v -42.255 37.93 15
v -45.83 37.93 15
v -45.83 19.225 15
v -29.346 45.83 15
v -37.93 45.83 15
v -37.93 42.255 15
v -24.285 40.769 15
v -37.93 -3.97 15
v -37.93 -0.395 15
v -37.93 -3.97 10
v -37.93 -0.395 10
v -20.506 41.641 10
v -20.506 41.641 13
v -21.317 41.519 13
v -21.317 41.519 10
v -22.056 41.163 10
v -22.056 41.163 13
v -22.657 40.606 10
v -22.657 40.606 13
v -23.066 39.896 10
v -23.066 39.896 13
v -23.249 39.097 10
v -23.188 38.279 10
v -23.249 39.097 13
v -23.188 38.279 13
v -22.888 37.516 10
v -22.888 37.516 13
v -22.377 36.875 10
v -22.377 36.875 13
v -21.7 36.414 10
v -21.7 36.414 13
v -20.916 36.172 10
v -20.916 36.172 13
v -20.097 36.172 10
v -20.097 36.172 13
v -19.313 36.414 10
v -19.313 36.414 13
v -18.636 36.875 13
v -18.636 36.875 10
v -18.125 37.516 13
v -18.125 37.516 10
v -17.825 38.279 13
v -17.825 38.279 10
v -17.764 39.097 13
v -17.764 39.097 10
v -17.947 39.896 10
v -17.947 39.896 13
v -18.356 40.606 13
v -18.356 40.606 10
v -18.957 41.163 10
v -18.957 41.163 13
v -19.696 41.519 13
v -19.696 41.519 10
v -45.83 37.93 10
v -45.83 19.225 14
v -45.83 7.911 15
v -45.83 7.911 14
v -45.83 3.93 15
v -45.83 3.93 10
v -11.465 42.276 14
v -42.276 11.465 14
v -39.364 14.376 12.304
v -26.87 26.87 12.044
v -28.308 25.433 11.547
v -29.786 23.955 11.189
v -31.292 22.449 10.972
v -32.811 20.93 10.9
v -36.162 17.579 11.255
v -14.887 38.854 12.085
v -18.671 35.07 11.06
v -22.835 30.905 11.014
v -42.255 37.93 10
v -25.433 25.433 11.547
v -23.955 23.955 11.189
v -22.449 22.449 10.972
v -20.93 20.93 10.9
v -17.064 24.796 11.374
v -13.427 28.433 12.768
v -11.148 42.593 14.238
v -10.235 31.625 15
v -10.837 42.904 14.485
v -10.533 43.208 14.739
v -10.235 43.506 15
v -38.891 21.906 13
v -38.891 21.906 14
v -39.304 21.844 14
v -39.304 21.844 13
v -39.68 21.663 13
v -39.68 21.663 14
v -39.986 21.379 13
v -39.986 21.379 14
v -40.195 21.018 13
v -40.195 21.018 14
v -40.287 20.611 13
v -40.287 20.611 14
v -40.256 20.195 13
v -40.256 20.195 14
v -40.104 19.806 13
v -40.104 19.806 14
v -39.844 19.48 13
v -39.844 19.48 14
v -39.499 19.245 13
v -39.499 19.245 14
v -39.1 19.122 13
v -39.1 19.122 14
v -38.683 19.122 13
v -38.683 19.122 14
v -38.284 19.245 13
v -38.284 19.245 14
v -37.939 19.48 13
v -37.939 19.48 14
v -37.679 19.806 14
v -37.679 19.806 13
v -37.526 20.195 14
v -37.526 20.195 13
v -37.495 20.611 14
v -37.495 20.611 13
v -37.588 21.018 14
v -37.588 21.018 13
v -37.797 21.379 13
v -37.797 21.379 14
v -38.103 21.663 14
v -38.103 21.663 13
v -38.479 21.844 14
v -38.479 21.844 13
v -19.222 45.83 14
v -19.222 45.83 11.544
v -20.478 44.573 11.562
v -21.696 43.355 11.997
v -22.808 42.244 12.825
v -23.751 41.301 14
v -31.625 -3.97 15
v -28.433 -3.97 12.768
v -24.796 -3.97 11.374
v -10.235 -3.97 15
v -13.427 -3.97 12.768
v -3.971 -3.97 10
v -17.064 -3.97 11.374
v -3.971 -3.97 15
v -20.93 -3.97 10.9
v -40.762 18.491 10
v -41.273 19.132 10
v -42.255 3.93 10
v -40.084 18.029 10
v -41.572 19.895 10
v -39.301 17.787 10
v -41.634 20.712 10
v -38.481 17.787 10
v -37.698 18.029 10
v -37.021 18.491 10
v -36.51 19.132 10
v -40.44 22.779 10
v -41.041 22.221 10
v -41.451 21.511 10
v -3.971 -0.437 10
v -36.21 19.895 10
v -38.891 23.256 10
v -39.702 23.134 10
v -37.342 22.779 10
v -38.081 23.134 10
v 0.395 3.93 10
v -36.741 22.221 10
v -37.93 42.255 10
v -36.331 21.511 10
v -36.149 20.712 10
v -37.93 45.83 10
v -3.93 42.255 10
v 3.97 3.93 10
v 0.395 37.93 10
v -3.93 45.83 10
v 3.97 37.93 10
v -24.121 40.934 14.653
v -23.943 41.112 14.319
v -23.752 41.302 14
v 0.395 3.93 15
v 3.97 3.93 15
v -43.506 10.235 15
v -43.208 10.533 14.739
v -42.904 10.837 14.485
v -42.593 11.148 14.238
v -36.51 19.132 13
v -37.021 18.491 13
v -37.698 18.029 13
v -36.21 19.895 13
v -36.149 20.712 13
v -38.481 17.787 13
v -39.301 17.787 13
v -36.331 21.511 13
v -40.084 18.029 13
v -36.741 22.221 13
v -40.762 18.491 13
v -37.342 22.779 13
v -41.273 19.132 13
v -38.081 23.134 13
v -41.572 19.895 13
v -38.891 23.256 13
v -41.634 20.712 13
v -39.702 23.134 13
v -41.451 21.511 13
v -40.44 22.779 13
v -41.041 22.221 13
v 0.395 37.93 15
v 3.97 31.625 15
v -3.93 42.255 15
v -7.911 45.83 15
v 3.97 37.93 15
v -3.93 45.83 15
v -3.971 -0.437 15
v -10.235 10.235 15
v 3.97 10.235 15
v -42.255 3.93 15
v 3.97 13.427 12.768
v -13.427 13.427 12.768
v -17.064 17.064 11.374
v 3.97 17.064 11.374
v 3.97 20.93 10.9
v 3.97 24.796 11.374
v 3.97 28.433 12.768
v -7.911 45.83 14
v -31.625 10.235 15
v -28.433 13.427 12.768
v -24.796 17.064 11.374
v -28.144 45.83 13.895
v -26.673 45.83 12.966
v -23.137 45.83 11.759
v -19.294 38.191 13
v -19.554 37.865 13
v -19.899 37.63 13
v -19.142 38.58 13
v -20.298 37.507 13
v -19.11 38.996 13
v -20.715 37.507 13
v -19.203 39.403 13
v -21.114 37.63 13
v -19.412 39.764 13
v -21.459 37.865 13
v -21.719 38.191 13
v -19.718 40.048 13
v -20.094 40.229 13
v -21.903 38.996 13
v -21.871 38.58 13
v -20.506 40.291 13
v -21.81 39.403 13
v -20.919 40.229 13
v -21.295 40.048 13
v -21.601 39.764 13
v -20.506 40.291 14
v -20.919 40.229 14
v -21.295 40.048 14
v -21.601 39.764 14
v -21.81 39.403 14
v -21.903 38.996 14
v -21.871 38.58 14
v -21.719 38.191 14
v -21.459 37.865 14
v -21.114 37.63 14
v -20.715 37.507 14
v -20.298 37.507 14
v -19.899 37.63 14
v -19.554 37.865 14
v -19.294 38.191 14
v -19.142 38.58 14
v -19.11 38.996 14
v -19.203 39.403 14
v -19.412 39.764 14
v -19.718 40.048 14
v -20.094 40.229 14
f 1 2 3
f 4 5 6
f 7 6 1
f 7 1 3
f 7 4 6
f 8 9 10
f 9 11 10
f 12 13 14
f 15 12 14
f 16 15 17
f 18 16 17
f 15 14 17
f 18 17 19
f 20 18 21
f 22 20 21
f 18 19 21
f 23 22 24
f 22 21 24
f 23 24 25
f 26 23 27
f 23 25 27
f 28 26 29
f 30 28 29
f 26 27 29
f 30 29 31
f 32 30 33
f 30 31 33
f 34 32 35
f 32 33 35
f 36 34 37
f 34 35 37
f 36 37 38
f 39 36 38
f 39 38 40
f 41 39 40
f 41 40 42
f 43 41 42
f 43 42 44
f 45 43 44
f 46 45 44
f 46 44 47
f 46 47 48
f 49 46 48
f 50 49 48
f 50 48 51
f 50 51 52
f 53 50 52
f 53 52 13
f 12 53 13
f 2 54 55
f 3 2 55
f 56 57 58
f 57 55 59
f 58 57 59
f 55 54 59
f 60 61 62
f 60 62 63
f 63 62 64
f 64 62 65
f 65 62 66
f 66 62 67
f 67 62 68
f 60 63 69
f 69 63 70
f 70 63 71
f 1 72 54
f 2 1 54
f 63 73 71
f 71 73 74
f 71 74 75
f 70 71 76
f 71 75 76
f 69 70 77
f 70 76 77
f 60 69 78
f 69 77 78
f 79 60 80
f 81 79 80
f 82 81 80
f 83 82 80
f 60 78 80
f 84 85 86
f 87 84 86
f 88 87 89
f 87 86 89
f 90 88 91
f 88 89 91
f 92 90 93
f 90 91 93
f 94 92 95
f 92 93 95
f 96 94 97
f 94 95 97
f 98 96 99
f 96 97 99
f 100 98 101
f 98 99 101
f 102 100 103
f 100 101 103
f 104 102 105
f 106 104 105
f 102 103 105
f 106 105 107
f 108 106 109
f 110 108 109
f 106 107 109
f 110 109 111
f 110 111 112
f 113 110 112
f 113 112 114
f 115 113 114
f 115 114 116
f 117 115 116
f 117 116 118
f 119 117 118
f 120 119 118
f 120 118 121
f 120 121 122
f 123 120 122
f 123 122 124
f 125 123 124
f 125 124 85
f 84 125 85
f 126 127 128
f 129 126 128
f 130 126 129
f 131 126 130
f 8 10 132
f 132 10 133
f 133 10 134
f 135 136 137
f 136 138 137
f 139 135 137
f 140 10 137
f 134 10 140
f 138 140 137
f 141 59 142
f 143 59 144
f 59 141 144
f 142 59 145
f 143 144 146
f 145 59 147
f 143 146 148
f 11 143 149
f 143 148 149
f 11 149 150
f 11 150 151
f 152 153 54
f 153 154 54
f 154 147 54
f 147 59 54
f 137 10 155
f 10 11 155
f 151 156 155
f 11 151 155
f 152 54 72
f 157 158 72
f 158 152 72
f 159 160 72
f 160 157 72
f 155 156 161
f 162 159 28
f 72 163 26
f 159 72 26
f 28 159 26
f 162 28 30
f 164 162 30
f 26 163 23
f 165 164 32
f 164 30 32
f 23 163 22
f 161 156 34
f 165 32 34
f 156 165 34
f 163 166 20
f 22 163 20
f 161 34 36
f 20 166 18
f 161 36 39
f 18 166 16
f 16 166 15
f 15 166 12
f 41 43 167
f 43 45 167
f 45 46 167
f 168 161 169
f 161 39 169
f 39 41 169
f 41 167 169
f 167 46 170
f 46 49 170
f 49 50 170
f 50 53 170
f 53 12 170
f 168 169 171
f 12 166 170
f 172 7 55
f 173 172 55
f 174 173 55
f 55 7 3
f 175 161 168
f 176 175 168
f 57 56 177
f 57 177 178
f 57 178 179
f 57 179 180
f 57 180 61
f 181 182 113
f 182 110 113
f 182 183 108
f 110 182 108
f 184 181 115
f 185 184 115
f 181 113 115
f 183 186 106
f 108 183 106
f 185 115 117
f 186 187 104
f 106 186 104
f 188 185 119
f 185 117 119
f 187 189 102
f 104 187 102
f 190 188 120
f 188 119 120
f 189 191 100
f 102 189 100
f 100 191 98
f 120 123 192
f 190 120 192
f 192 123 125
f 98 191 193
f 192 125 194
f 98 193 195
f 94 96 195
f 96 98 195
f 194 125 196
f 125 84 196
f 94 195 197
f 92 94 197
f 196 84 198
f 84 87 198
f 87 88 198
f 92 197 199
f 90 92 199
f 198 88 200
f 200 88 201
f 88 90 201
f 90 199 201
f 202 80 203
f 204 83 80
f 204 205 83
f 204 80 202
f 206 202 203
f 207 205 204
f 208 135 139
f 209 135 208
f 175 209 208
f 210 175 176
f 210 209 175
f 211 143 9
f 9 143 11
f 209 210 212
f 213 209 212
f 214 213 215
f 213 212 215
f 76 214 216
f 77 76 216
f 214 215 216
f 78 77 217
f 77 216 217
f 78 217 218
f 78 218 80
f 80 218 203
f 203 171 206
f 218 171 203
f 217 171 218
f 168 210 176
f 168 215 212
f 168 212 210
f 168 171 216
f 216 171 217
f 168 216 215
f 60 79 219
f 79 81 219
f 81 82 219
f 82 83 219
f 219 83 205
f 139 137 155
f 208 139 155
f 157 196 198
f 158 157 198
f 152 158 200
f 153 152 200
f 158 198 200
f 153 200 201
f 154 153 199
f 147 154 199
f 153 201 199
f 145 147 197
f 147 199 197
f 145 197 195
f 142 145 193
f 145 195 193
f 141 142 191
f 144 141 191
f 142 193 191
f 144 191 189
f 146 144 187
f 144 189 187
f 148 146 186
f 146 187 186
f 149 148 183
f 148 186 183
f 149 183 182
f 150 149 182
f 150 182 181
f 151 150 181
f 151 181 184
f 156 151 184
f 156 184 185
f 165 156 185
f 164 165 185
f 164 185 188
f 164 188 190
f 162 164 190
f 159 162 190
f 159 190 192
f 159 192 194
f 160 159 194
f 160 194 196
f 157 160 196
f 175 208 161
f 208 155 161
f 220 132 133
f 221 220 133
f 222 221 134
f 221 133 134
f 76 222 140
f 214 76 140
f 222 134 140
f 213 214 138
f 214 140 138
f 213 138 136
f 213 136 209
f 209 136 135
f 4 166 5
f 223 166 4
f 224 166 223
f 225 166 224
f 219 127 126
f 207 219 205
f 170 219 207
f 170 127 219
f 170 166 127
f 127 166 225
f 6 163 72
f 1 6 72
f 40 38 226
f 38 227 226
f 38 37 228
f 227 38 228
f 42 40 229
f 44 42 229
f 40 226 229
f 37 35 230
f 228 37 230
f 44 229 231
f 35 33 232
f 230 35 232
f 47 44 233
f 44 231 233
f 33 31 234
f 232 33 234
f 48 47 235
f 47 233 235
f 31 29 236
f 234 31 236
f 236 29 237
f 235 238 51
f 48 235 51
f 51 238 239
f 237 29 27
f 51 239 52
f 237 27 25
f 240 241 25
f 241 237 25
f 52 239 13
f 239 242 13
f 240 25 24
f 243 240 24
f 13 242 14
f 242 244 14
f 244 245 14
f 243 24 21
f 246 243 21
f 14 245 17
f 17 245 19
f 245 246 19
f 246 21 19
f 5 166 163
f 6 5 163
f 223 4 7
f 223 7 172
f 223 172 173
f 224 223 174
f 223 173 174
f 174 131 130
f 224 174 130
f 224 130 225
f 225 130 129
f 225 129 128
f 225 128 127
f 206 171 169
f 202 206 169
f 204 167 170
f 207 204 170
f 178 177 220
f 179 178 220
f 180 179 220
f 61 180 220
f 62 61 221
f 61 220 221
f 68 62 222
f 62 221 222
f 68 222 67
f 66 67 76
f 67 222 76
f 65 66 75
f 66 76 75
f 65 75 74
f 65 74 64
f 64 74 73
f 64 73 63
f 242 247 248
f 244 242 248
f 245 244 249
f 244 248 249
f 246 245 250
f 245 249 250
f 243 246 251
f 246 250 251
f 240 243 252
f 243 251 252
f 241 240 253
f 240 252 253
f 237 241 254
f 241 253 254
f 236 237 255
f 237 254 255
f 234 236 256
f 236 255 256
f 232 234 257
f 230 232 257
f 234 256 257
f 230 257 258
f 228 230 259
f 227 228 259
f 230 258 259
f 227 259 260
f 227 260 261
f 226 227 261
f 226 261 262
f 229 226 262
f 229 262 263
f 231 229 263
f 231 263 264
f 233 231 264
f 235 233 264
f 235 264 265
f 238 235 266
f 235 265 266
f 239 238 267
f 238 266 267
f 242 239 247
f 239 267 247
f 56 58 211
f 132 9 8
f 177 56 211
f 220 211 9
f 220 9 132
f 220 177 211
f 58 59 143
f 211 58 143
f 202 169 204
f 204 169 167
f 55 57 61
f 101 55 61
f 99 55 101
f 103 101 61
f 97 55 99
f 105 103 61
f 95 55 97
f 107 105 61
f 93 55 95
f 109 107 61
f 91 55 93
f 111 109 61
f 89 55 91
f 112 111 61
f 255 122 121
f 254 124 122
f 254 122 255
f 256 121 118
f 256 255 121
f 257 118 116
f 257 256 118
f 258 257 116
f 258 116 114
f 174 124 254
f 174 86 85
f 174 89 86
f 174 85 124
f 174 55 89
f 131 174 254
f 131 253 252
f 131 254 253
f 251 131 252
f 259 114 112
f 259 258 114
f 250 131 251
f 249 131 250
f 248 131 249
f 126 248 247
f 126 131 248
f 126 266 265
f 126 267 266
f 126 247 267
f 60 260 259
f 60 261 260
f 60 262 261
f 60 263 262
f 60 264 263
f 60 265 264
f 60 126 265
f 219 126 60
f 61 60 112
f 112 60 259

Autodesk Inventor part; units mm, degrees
ref_plane "Work Plane1" through (0, 0, 10) normal (0, 0, 1) x (1, 0, 0)
sketch "Sketch1" plane through (0, 0, 10) normal (0, 0, 1) x (1, 0, 0)
  line L0 (-4.0299, -0.3538) -> (-2.2322, 1.4439) construction
  arc A0 (-1.4439, 2.2322) -> (-2.2322, 1.4439) centre (-0.9299, 0.9299) ccw construction
  line L1 (-1.4439, 2.2322) -> (0.3538, 4.0299) construction
  line L2 (-37.8299, 42.8299) -> (-37.8299, 37.8299) construction
  line L3 (-37.8299, 37.8299) -> (-42.9208, 37.8299) construction
  line L4 (-37.8299, 42.2137) -> (-37.8299, 45.8299) construction
  line L5 (-37.8299, 45.8299) -> (-4.0299, 45.8299) construction
  line L6 (-4.0299, 45.8299) -> (-4.0299, 42.2137) construction
  line L7 (-4.0299, 4.0299) -> (0.3538, 4.0299) projected
  circle A1 centre (-20.9299, 20.9299) radius 17.5 projected
  line L8 (-20.9299, 58.9723) -> (17.1124, 20.9299) construction
  line L9 (17.1124, 20.9299) -> (-20.9299, -17.1124) construction
  line L10 (-20.9299, -17.1124) -> (-58.9723, 20.9299) construction
  line L11 (-58.9723, 20.9299) -> (-20.9299, 58.9723) construction
  line L12 (-20.9299, 58.9723) -> (-20.9299, -17.1124) construction
  line L13 (17.1124, 20.9299) -> (-58.9723, 20.9299) construction
  line L14 (-20.9299, 58.9723) -> (32.8701, 58.9723) construction
  line L15 (-43.4299, 43.4299) -> (1.5701, 43.4299) construction
  line L16 (1.5701, 43.4299) -> (1.5701, -1.5701) construction
  line L17 (1.5701, -1.5701) -> (-43.4299, -1.5701) construction
  line L18 (-43.4299, -1.5701) -> (-43.4299, 43.4299) construction
  line L19 (-43.4299, 43.4299) -> (1.5701, -1.5701) construction
  line L20 (1.5701, 43.4299) -> (-43.4299, -1.5701) construction
  line L21 (-43.4299, 5.3876) -> (-43.4299, 36.4723)
  line L22 (-43.4299, 36.4723) -> (-36.4723, 43.4299)
  line L23 (-36.4723, 43.4299) -> (-5.3876, 43.4299)
  line L24 (-5.3876, 43.4299) -> (1.5701, 36.4723)
  line L25 (1.5701, 36.4723) -> (1.5701, 5.3876)
  line L26 (1.5701, 5.3876) -> (-5.3876, -1.5701)
  line L27 (-5.3876, -1.5701) -> (-36.4723, -1.5701)
  line L28 (-36.4723, -1.5701) -> (-43.4299, 5.3876)
  line L29 (-4.0299, 42.2137) -> (-37.8299, 42.2137) projected
  line L30 (-4.0299, -0.3538) -> (-4.0299, 4.0299) projected
  circle A2 centre (-20.9299, 20.9299) radius 1.4
  line L31 (-10.9299, 10.9299) -> (-30.9299, 10.9299) construction
  line L32 (-30.9299, 10.9299) -> (-30.9299, 30.9299) construction
  line L33 (-30.9299, 30.9299) -> (-10.9299, 30.9299) construction
  line L34 (-10.9299, 30.9299) -> (-10.9299, 10.9299) construction
  line L35 (-10.9299, 10.9299) -> (-30.9299, 30.9299) construction
  line L36 (-30.9299, 10.9299) -> (-10.9299, 30.9299) construction
  circle A3 centre (-30.9299, 30.9299) radius 1.4
  circle A4 centre (-30.9299, 10.9299) radius 1.4
  circle A5 centre (-10.9299, 10.9299) radius 1.4
  line L37 (-45.8299, 37.8299) -> (-42.0723, 37.8299) construction
  line L38 (-42.1723, 37.7299) -> (-45.8299, 37.7299)
  line L39 (-45.8299, 37.7299) -> (-45.8299, 4.1299)
  line L40 (-45.8299, 4.1299) -> (-42.1723, 4.1299)
  line L41 (-42.1723, 4.1299) -> (-42.1723, 37.7299)
  line L42 (-45.8299, 4.0299) -> (-42.0723, 4.0299) construction
  line L43 (-45.8299, 37.8299) -> (-42.0723, 37.8299) projected
  line L44 (-37.7299, 45.8299) -> (-4.1299, 45.8299)
  line L45 (-4.1299, 45.8299) -> (-4.1299, 42.1723)
  line L46 (-4.1299, 42.1723) -> (-37.7299, 42.1723)
  line L47 (-37.7299, 42.1723) -> (-37.7299, 45.8299)
  line L48 (0.4701, 37.8299) -> (0.4701, 4.0299) construction
  line L49 (0.4701, 4.0299) -> (3.9701, 4.0299) construction
  line L50 (3.9701, 37.8299) -> (3.9701, 4.0299) construction
  line L51 (0.4701, 37.8299) -> (3.9701, 37.8299) construction
  line L52 (-45.8299, -3.9701) -> (-4.0299, -3.9701) construction
  line L53 (0.3124, 37.7299) -> (3.9701, 37.7299)
  line L54 (3.9701, 37.7299) -> (3.9701, 4.1299)
  line L55 (3.9701, 4.1299) -> (0.3124, 4.1299)
  line L56 (0.3124, 4.1299) -> (0.3124, 37.7299)
  line L57 (-4.1713, -0.3538) -> (-37.7299, -0.3538)
  line L58 (-37.7299, -0.3538) -> (-37.7299, -3.9701)
  line L59 (-37.7299, -3.9701) -> (-4.1713, -3.9701)
  line L60 (-4.1713, -3.9701) -> (-4.1713, -0.3538)
  point P0 (-37.8299, 4.0299)
  dimension "d18" = 53.8
  dimension "d19" = 45
  dimension "d20" = 53.8
  dimension "d21" = 45
  dimension "d22" = 45
  dimension "d30" = 20
  dimension "d31" = 20
  dimension "d32" = 2.8
  dimension "d33" = 2.8
  dimension "d34" = 2.8
  dimension "d35" = 2.8
  dimension "d36" = 0.1
  dimension "d37" = 0.1
  dimension "d38" = 0.1
  dimension "d39" = 0.1
extrude "Extrusion1" add sketch "Sketch1" along normal blind 5 contours L30 L26 L57 L28 L41 L22 L46 L24 L56 L7 | L7 L26 L30 | L56 L24 L25 L26 | L26 L25 L24 L53 L54 L55 | L60 L59 L58 L57 L28 L27 L26 | L26 L27 L28 L57 | L46 L22 L29 L24 | L24 L29 L45 | L40 L39 L38 L22 L21 L28 | L28 L21 L22 L41 | L29 L22 L23 L24 | L24 L23 L22 L29 L47 L44 L45 | L47 L29 L22 | A1 | A2 | A3 | A4 | A5
sketch "Sketch4" plane through (0, 0, 15) normal (0, 0, 1) x (1, 0, 0)
  line L0 (-37.7299, 42.1723) -> (-42.1723, 37.7299) projected
  line L1 (-42.1723, 37.7299) -> (-45.8299, 37.7299) projected
  line L2 (-45.8299, 37.7299) -> (-45.8299, 4.1299) projected
  line L3 (-45.8299, 4.1299) -> (-42.1723, 4.1299) projected
  line L4 (-42.1723, 4.1299) -> (-37.6885, -0.3538) projected
  line L5 (-37.6885, -0.3538) -> (-37.7299, -0.3538) projected
  line L6 (-37.7299, -0.3538) -> (-37.7299, -3.9701) projected
  line L7 (-37.7299, -3.9701) -> (-4.1713, -3.9701) projected
  line L8 (-4.1713, -3.9701) -> (-4.1713, -0.3538) projected
  line L9 (-4.1713, -0.3538) -> (0.3124, 4.1299) projected
  line L10 (0.3124, 4.1299) -> (3.9701, 4.1299) projected
  line L11 (3.9701, 4.1299) -> (3.9701, 37.7299) projected
  line L12 (3.9701, 37.7299) -> (0.3124, 37.7299) projected
  line L13 (0.3124, 37.7299) -> (-4.1299, 42.1723) projected
  line L14 (-4.1299, 42.1723) -> (-4.1299, 45.8299) projected
  line L15 (-4.1299, 45.8299) -> (-37.7299, 45.8299) projected
  line L16 (-37.7299, 45.8299) -> (-37.7299, 42.1723) projected
  line L17 (-45.8299, 37.7299) -> (-45.8299, 4.1299) projected
  line L18 (-45.8299, 7.911) -> (-7.911, 45.8299)
  line L19 (-45.8299, 7.911) -> (7.7955, 7.911) construction
  line L20 (-7.911, 45.8299) -> (-19.2247, 45.8299)
  line L21 (-4.1299, 45.8299) -> (-37.7299, 45.8299) projected
  line L22 (-19.2247, 45.8299) -> (-45.8299, 19.2247)
  line L23 (-45.8299, 7.911) -> (-45.8299, 19.2247)
  circle A0 centre (-40.9299, 0.9299) radius 1.1933 projected
  circle A1 centre (-0.9299, 40.9299) radius 1.4 projected
  line L24 (-40.9299, 0.9299) -> (-0.9299, 40.9299)
  line L25 (0.3124, 37.7299) -> (-4.1299, 42.1723) projected
  point P0 (0, 0)
  dimension "d40" = 45
  dimension "d41" = 8
extrude "Extrusion4" add sketch "Sketch4" along normal blind 28 contours L15 L18 L2 L22
sketch "Sketch5" plane through (-45.8299, 19.2247, 15) normal (-0.7071068, 0.7071068, 0) x (-0.7071068, -0.7071068, 0)
  line L0 (0, 0) -> (-37.6254, 0) projected
  line L1 (0, 0) -> (0, 28) projected
  line L2 (-37.6254, 28) -> (0, 28) projected
  line L3 (-37.6254, 0) -> (-37.6254, 28) projected
  circle A0 centre (-18.8127, 9.1873) radius 18.8127
  line L4 (-6.8127, 24) -> (-36.8127, 24) construction
  line L5 (-36.8127, 24) -> (-36.8127, 4) construction
  line L6 (-36.8127, 4) -> (-6.8127, 4) construction
  line L7 (-6.8127, 4) -> (-6.8127, 24) construction
  line L8 (-6.8127, 24) -> (-36.8127, 4) construction
  line L9 (-36.8127, 24) -> (-6.8127, 4) construction
  point P0 (-18.8127, -15)
  point P1 (-21.8127, 14)
  dimension "d44" = 30
  dimension "d45" = 20
hole "Hole1" at (-19.7994, 45.2552, 39) at (-19.7994, 45.2552, 19) at (-41.0126, 24.042, 39) at (-30.406, 34.6486, 29) direction (0.7071068, -0.7071068, 0) diameter 2.8 depth 12
sketch "Sketch6" plane through (-37.7299, -3.9701, 10) normal (0, -1, 0) x (1, 0, 0)
  circle A0 centre (-3.2, 36.9) radius 1.45 projected
  circle A1 centre (36.8, 36.9) radius 1.45 projected
  line L0 (-6.1, 0) -> (-6.1, 39.8) projected
  line L1 (-0.1, 0) -> (-6.1, 0) projected
  line L2 (-0.1, 33.8) -> (-0.1, 0) projected
  line L3 (33.7, 33.8) -> (-0.1, 33.8) projected
  line L4 (33.7, 33.8) -> (33.7, 0) projected
  line L5 (39.7, 0) -> (33.7, 0) projected
  line L6 (39.7, 39.8) -> (39.7, 0) projected
  line L7 (-6.1, 39.8) -> (39.7, 39.8) projected
  circle A2 centre (16.8, 16.9) radius 16.9
  circle A3 centre (16.8, 16.9) radius 14.9
  line L8 (-0.1, 16.9) -> (-0.1, 0)
  line L9 (0, 0) -> (33.5586, 0) projected
  line L10 (0.0414, 0) -> (-4.4423, 0) projected
  line L11 (33.5586, 0) -> (0.0414, 0)
  line L12 (33.7, 16.9) -> (33.5586, 0)
  point P0 (37.7299, -10)
  dimension "d53" = 2
extrude "Extrusion5" cut sketch "Sketch6" against normal up to surface contours A3 surface through (-45.8299, 7.911, 15) normal (0.7071068, -0.7071068, 0)
ref_plane "Work Plane3" through (3.9701, 45.8299, 26) normal (1, 0, 0) x (0, -1, 0)
sketch "Sketch7" plane through (3.9701, 45.8299, 26) normal (1, 0, 0) x (0, -1, 0)
  line L0 (41.8, -17.8) -> (41.8, 16) projected
  line L1 (8, -17.8) -> (41.8, -17.8) projected
  line L2 (8, -17.8) -> (8, 16) projected
  circle A0 centre (24.9, -0.9) radius 16.9
  circle A1 centre (24.9, -0.9) radius 14.9
  circle A2 centre (24.9, -0.9) radius 16
  point P0 (45.8299, 26)
  dimension "d56" = 2
  dimension "d81" = 32
ref_plane "Work Plane4" through (-34.8055, 8.3289, 16.6138) normal (0.7071068, -0.7071068, 0) x (0.7071068, 0.7071068, 0)
extrude "Extrusion6" cut sketch "Sketch7" against normal up to surface contours A1 surface through (-45.8299, 7.911, 15) normal (0.7071068, -0.7071068, 0)
sketch "Sketch8" plane through (-45.8299, 19.2247, 15) normal (-0.7071068, 0.7071068, 0) x (-0.7071068, -0.7071068, 0)
  arc A0 (-37.6254, 2.8601) -> (-37.6254, 5.1399) centre (-36.8127, 4) ccw projected
  circle A1 centre (-36.8127, 4) radius 7.5
  point P0 (-18.8127, -15)
  dimension "d59" = 15
extrude "Extrusion7" cut sketch "Sketch8" along normal blind 10
sketch "Sketch9" plane through (0, 0, 10) normal (0, 0, -1) x (-1, 0, 0)
  line L0 (45.8299, 19.2247) -> (24.2855, 40.7692) projected
  line L1 (41.7776, 11.9633) -> (26.8705, 26.8705) projected
  line L2 (26.8705, 26.8705) -> (11.9633, 41.7776) projected
  line L3 (19.2247, 45.8299) -> (24.2855, 40.7692) projected
  line L4 (7.911, 45.8299) -> (11.9633, 41.7776) projected
  line L5 (41.7776, 11.9633) -> (45.8299, 7.911) projected
  line L6 (15.1325, 38.6084) -> (20.7894, 44.2653) projected
  line L7 (13.1526, 40.5883) -> (18.3942, 45.8299) projected
  line L8 (34.3658, 19.3751) -> (40.0227, 25.032) projected
  line L9 (36.3457, 17.3952) -> (42.0026, 23.0521) projected
  circle A0 centre (20.5065, 38.8913) radius 1.4
  line L10 (25.7391, 28.0018) -> (31.396, 33.6587) projected
  line L11 (31.396, 33.6587) -> (25.7391, 28.0018)
  line L12 (26.8705, 26.8705) -> (32.5273, 32.5273)
  circle A1 centre (38.8913, 20.5065) radius 1.4
  point P0 (0, 0)
  point P1 (34.7528, 24.7491)
  dimension "d62" = 2.8
hole "Hole2" at (-20.5065, 38.8913, 10) at (-38.8913, 20.5065, 10) direction (0, 0, 1) diameter 2.8 depth 12 counterbore diameter 5.5 counterbore depth 3
sketch "Sketch13" plane through (0, 0, 43) normal (0, 0, 1) x (1, 0, 0)
  line L0 (-7.911, 45.8299) -> (-19.2247, 45.8299) projected
  line L1 (-19.2247, 45.8299) -> (-45.8299, 19.2247) projected
  line L2 (-45.8299, 19.2247) -> (-45.8299, 7.911) projected
  line L3 (-45.8299, 7.911) -> (-7.911, 45.8299) projected
  point P0 (0, 0)
extrude "Extrusion10" cut sketch "Sketch13" against normal blind 29
sketch "Sketch14" plane through (0, 0, 10) normal (0, 0, -1) x (-1, 0, 0)
  circle A0 centre (20.5065, 38.8913) radius 2.75 construction
  circle A1 centre (38.8913, 20.5065) radius 2.75 construction
  line L0 (42.1723, 37.7299) -> (37.7299, 42.1723) projected
  line L1 (37.7299, 45.8299) -> (37.7299, 42.1723) projected
  line L2 (4.1299, 45.8299) -> (37.7299, 45.8299) construction
  line L3 (4.1299, 42.1723) -> (4.1299, 45.8299) projected
  line L4 (4.1299, 42.1723) -> (-0.3124, 37.7299) projected
  line L5 (-3.9701, 37.7299) -> (-0.3124, 37.7299) projected
  line L6 (-3.9701, 4.1299) -> (-3.9701, 37.7299) construction
  line L7 (-0.3124, 4.1299) -> (-3.9701, 4.1299) projected
  line L8 (-0.3124, 4.1299) -> (4.1713, -0.3538) projected
  line L9 (4.1713, -3.9701) -> (4.1713, -0.3538) projected
  line L10 (37.7299, -3.9701) -> (4.1713, -3.9701) construction
  line L11 (37.7299, -0.3538) -> (37.7299, -3.9701) projected
  line L12 (37.6885, -0.3538) -> (37.7299, -0.3538) projected
  line L13 (37.6885, -0.3538) -> (42.1723, 4.1299) projected
  line L14 (45.8299, 4.1299) -> (42.1723, 4.1299) projected
  line L15 (45.8299, 37.7299) -> (45.8299, 4.1299) construction
  line L16 (42.1723, 37.7299) -> (45.8299, 37.7299) projected
  line L17 (3.9713, -4.1701) -> (3.9713, -0.4367)
  line L18 (3.9713, -0.4367) -> (-0.3953, 3.9299)
  line L19 (-0.3953, 3.9299) -> (-4.1701, 3.9299)
  line L20 (-4.1701, 3.9299) -> (-4.1701, 37.9299) construction
  line L21 (-4.1701, 37.9299) -> (-0.3953, 37.9299)
  line L22 (-0.3953, 37.9299) -> (3.9299, 42.2551)
  line L23 (3.9299, 42.2551) -> (3.9299, 46.0299)
  line L24 (3.9299, 46.0299) -> (37.9299, 46.0299) construction
  line L25 (37.9299, 46.0299) -> (37.9299, 42.2551)
  line L26 (37.9299, 42.2551) -> (42.2551, 37.9299)
  line L27 (42.2551, 37.9299) -> (46.0299, 37.9299)
  line L28 (46.0299, 37.9299) -> (46.0299, 3.9299) construction
  line L29 (46.0299, 3.9299) -> (42.2551, 3.9299)
  line L30 (42.2551, 3.9299) -> (37.9299, -0.3953)
  line L31 (37.9299, -0.3953) -> (37.9299, -4.1701)
  line L32 (37.9299, -4.1701) -> (3.9713, -4.1701) construction
  line L33 (45.8299, 4.1299) -> (42.1723, 4.1299) projected
  line L34 (45.8299, 4.1299) -> (45.8299, 3.9299)
  line L35 (37.7299, -0.3538) -> (37.7299, -3.9701) projected
  line L36 (37.7299, -3.9701) -> (37.9299, -3.9701)
  line L37 (4.1713, -3.9701) -> (4.1713, -0.3538) projected
  line L38 (4.1713, -3.9701) -> (3.9713, -3.9701)
  line L39 (-0.3124, 4.1299) -> (-3.9701, 4.1299) projected
  line L40 (-3.9701, 4.1299) -> (-3.9701, 3.9299)
  line L41 (4.1299, 45.8299) -> (3.9299, 45.8299)
  line L42 (-3.9701, 37.7299) -> (-3.9701, 37.9299)
  line L43 (42.1723, 37.7299) -> (45.8299, 37.7299) projected
  line L44 (45.8299, 37.7299) -> (45.8299, 37.9299)
  line L45 (37.7299, 45.8299) -> (37.7299, 42.1723) projected
  line L46 (37.7299, 45.8299) -> (37.9299, 45.8299)
  point P0 (0, 0)
  dimension "d78" = 0.2
extrude "Extrusion11" add sketch "Sketch14" against normal up to surface (5 mm away)
sketch "Skizze15" plane through (3.9701, 20.9299, 26.9) normal (1, 0, 0) x (0, 0, -1)
  arc A0 (11.9, -8.9666) -> (11.9, 8.9666) centre (0, 0) ccw projected
  circle A1 centre (0, 0) radius 16
  point P0 (26.9, -20.9299)
  dimension "d82" = 32
ref_plane "Arbeitsebene5" through (-45.8299, 7.911, 14) normal (0.7071068, -0.7071068, 0) x (0.7071068, 0.7071068, 0)
extrude "Extrusion12" cut sketch "Skizze15" against normal up to surface surface through (-45.8299, 7.911, 14) normal (0.7071068, -0.7071068, 0)
sketch "Skizze16" plane through (-20.9299, -3.9701, 26.9) normal (0, -1, 0) x (1, 0, 0)
  arc A0 (-8.9666, -11.9) -> (8.9666, -11.9) centre (0, 0) ccw projected
  line L0 (-8.9666, -11.9) -> (-17, -11.9) projected
  line L1 (-17, -16.9) -> (-17, -11.9) projected
  line L2 (16.9586, -16.9) -> (-17, -16.9) projected
  line L3 (16.9586, -16.9) -> (16.9586, -11.9) projected
  line L4 (8.9666, -11.9) -> (16.9586, -11.9) projected
  circle A1 centre (0, 0) radius 16
  point P0 (20.9299, -26.9)
  dimension "d85" = 32
ref_plane "Arbeitsebene6" through (-45.8299, 7.911, 14) normal (0.7071068, -0.7071068, 0) x (0.7071068, 0.7071068, 0)
extrude "Extrusion13" cut sketch "Skizze16" against normal up to surface contours L0 A1 L4 A0 | A0 L4 A1 L0 surface through (-45.8299, 7.911, 14) normal (0.7071068, -0.7071068, 0)
sketch "Sketch11" plane through (0, 0, 43) normal (0, 0, 1) x (1, 0, 0)
  line L0 (-7.911, 45.8299) -> (-19.2247, 45.8299) projected
  line L1 (-19.2247, 45.8299) -> (-45.8299, 19.2247) projected
  line L2 (-45.8299, 19.2247) -> (-45.8299, 7.911) projected
  line L3 (-45.8299, 7.911) -> (-7.911, 45.8299) projected
  line L4 (-45.8299, 37.7299) -> (-45.8299, 19.2247) projected
  line L5 (-42.1723, 37.7299) -> (-45.8299, 37.7299) projected
  line L6 (-37.7299, 42.1723) -> (-42.1723, 37.7299) projected
  line L7 (-37.7299, 45.8299) -> (-37.7299, 42.1723) projected
  line L8 (-29.3463, 45.8299) -> (-37.7299, 45.8299) projected
  line L9 (-29.3463, 45.8299) -> (-19.2247, 45.8299) projected
  line L10 (-4.1299, 45.8299) -> (-7.911, 45.8299) projected
  line L11 (-4.1299, 42.1723) -> (-4.1299, 45.8299) projected
  line L12 (0.3124, 37.7299) -> (-4.1299, 42.1723) projected
  line L13 (3.9701, 37.7299) -> (0.3124, 37.7299) projected
  line L14 (3.9701, 29.8965) -> (3.9701, 11.9633) projected
  line L15 (3.9701, 29.8965) -> (3.9701, 37.7299) projected
  line L16 (-11.9633, -3.9701) -> (-4.1713, -3.9701) projected
  line L17 (-4.1713, -3.9701) -> (-4.1713, -0.3538) projected
  line L18 (-4.1713, -0.3538) -> (0.3124, 4.1299) projected
  line L19 (0.3124, 4.1299) -> (3.9701, 4.1299) projected
  line L20 (3.9701, 4.1299) -> (3.9701, 11.9633) projected
  line L21 (-11.9633, -3.9701) -> (-29.8965, -3.9701) projected
  line L22 (-37.7299, -3.9701) -> (-29.8965, -3.9701) projected
  line L23 (-37.7299, -0.3538) -> (-37.7299, -3.9701) projected
  line L24 (-45.8299, 7.911) -> (-7.911, 45.8299) projected
  line L25 (-45.8299, 7.911) -> (-7.911, 45.8299)
  line L26 (-45.8299, 7.911) -> (-45.8299, 4.1299) projected
  line L27 (-45.8299, 4.1299) -> (-42.1723, 4.1299) projected
  line L28 (-37.6885, -0.3538) -> (-37.7299, -0.3538) projected
  line L29 (-42.1723, 4.1299) -> (-37.6885, -0.3538) projected
  point P0 (0, 0)
sketch "Sketch12" plane through (-45.8299, 19.2247, 10) normal (-0.7071068, 0.7071068, 0) x (-0.7071068, -0.7071068, 0)
  line L0 (-45.6254, 33) -> (-45.6254, 0) projected
  line L1 (8, 0) -> (8, 33) projected
  line L2 (-45.6254, 0) -> (8, 0)
  line L3 (8, 0) -> (8, 4)
  line L4 (8, 4) -> (-45.6254, 4)
  line L5 (-45.6254, 4) -> (-45.6254, 0)
  point P0 (-18.8127, -10)
  point P1 (45.6254, -4)
  point P2 (45.6254, -5)
  point P3 (-8, -5)
  point P4 (-8, -4)
  dimension "d73" = 4
properties part number "20_Cube_Insert_Kinematic_Mirrormount_45_base_part1"
